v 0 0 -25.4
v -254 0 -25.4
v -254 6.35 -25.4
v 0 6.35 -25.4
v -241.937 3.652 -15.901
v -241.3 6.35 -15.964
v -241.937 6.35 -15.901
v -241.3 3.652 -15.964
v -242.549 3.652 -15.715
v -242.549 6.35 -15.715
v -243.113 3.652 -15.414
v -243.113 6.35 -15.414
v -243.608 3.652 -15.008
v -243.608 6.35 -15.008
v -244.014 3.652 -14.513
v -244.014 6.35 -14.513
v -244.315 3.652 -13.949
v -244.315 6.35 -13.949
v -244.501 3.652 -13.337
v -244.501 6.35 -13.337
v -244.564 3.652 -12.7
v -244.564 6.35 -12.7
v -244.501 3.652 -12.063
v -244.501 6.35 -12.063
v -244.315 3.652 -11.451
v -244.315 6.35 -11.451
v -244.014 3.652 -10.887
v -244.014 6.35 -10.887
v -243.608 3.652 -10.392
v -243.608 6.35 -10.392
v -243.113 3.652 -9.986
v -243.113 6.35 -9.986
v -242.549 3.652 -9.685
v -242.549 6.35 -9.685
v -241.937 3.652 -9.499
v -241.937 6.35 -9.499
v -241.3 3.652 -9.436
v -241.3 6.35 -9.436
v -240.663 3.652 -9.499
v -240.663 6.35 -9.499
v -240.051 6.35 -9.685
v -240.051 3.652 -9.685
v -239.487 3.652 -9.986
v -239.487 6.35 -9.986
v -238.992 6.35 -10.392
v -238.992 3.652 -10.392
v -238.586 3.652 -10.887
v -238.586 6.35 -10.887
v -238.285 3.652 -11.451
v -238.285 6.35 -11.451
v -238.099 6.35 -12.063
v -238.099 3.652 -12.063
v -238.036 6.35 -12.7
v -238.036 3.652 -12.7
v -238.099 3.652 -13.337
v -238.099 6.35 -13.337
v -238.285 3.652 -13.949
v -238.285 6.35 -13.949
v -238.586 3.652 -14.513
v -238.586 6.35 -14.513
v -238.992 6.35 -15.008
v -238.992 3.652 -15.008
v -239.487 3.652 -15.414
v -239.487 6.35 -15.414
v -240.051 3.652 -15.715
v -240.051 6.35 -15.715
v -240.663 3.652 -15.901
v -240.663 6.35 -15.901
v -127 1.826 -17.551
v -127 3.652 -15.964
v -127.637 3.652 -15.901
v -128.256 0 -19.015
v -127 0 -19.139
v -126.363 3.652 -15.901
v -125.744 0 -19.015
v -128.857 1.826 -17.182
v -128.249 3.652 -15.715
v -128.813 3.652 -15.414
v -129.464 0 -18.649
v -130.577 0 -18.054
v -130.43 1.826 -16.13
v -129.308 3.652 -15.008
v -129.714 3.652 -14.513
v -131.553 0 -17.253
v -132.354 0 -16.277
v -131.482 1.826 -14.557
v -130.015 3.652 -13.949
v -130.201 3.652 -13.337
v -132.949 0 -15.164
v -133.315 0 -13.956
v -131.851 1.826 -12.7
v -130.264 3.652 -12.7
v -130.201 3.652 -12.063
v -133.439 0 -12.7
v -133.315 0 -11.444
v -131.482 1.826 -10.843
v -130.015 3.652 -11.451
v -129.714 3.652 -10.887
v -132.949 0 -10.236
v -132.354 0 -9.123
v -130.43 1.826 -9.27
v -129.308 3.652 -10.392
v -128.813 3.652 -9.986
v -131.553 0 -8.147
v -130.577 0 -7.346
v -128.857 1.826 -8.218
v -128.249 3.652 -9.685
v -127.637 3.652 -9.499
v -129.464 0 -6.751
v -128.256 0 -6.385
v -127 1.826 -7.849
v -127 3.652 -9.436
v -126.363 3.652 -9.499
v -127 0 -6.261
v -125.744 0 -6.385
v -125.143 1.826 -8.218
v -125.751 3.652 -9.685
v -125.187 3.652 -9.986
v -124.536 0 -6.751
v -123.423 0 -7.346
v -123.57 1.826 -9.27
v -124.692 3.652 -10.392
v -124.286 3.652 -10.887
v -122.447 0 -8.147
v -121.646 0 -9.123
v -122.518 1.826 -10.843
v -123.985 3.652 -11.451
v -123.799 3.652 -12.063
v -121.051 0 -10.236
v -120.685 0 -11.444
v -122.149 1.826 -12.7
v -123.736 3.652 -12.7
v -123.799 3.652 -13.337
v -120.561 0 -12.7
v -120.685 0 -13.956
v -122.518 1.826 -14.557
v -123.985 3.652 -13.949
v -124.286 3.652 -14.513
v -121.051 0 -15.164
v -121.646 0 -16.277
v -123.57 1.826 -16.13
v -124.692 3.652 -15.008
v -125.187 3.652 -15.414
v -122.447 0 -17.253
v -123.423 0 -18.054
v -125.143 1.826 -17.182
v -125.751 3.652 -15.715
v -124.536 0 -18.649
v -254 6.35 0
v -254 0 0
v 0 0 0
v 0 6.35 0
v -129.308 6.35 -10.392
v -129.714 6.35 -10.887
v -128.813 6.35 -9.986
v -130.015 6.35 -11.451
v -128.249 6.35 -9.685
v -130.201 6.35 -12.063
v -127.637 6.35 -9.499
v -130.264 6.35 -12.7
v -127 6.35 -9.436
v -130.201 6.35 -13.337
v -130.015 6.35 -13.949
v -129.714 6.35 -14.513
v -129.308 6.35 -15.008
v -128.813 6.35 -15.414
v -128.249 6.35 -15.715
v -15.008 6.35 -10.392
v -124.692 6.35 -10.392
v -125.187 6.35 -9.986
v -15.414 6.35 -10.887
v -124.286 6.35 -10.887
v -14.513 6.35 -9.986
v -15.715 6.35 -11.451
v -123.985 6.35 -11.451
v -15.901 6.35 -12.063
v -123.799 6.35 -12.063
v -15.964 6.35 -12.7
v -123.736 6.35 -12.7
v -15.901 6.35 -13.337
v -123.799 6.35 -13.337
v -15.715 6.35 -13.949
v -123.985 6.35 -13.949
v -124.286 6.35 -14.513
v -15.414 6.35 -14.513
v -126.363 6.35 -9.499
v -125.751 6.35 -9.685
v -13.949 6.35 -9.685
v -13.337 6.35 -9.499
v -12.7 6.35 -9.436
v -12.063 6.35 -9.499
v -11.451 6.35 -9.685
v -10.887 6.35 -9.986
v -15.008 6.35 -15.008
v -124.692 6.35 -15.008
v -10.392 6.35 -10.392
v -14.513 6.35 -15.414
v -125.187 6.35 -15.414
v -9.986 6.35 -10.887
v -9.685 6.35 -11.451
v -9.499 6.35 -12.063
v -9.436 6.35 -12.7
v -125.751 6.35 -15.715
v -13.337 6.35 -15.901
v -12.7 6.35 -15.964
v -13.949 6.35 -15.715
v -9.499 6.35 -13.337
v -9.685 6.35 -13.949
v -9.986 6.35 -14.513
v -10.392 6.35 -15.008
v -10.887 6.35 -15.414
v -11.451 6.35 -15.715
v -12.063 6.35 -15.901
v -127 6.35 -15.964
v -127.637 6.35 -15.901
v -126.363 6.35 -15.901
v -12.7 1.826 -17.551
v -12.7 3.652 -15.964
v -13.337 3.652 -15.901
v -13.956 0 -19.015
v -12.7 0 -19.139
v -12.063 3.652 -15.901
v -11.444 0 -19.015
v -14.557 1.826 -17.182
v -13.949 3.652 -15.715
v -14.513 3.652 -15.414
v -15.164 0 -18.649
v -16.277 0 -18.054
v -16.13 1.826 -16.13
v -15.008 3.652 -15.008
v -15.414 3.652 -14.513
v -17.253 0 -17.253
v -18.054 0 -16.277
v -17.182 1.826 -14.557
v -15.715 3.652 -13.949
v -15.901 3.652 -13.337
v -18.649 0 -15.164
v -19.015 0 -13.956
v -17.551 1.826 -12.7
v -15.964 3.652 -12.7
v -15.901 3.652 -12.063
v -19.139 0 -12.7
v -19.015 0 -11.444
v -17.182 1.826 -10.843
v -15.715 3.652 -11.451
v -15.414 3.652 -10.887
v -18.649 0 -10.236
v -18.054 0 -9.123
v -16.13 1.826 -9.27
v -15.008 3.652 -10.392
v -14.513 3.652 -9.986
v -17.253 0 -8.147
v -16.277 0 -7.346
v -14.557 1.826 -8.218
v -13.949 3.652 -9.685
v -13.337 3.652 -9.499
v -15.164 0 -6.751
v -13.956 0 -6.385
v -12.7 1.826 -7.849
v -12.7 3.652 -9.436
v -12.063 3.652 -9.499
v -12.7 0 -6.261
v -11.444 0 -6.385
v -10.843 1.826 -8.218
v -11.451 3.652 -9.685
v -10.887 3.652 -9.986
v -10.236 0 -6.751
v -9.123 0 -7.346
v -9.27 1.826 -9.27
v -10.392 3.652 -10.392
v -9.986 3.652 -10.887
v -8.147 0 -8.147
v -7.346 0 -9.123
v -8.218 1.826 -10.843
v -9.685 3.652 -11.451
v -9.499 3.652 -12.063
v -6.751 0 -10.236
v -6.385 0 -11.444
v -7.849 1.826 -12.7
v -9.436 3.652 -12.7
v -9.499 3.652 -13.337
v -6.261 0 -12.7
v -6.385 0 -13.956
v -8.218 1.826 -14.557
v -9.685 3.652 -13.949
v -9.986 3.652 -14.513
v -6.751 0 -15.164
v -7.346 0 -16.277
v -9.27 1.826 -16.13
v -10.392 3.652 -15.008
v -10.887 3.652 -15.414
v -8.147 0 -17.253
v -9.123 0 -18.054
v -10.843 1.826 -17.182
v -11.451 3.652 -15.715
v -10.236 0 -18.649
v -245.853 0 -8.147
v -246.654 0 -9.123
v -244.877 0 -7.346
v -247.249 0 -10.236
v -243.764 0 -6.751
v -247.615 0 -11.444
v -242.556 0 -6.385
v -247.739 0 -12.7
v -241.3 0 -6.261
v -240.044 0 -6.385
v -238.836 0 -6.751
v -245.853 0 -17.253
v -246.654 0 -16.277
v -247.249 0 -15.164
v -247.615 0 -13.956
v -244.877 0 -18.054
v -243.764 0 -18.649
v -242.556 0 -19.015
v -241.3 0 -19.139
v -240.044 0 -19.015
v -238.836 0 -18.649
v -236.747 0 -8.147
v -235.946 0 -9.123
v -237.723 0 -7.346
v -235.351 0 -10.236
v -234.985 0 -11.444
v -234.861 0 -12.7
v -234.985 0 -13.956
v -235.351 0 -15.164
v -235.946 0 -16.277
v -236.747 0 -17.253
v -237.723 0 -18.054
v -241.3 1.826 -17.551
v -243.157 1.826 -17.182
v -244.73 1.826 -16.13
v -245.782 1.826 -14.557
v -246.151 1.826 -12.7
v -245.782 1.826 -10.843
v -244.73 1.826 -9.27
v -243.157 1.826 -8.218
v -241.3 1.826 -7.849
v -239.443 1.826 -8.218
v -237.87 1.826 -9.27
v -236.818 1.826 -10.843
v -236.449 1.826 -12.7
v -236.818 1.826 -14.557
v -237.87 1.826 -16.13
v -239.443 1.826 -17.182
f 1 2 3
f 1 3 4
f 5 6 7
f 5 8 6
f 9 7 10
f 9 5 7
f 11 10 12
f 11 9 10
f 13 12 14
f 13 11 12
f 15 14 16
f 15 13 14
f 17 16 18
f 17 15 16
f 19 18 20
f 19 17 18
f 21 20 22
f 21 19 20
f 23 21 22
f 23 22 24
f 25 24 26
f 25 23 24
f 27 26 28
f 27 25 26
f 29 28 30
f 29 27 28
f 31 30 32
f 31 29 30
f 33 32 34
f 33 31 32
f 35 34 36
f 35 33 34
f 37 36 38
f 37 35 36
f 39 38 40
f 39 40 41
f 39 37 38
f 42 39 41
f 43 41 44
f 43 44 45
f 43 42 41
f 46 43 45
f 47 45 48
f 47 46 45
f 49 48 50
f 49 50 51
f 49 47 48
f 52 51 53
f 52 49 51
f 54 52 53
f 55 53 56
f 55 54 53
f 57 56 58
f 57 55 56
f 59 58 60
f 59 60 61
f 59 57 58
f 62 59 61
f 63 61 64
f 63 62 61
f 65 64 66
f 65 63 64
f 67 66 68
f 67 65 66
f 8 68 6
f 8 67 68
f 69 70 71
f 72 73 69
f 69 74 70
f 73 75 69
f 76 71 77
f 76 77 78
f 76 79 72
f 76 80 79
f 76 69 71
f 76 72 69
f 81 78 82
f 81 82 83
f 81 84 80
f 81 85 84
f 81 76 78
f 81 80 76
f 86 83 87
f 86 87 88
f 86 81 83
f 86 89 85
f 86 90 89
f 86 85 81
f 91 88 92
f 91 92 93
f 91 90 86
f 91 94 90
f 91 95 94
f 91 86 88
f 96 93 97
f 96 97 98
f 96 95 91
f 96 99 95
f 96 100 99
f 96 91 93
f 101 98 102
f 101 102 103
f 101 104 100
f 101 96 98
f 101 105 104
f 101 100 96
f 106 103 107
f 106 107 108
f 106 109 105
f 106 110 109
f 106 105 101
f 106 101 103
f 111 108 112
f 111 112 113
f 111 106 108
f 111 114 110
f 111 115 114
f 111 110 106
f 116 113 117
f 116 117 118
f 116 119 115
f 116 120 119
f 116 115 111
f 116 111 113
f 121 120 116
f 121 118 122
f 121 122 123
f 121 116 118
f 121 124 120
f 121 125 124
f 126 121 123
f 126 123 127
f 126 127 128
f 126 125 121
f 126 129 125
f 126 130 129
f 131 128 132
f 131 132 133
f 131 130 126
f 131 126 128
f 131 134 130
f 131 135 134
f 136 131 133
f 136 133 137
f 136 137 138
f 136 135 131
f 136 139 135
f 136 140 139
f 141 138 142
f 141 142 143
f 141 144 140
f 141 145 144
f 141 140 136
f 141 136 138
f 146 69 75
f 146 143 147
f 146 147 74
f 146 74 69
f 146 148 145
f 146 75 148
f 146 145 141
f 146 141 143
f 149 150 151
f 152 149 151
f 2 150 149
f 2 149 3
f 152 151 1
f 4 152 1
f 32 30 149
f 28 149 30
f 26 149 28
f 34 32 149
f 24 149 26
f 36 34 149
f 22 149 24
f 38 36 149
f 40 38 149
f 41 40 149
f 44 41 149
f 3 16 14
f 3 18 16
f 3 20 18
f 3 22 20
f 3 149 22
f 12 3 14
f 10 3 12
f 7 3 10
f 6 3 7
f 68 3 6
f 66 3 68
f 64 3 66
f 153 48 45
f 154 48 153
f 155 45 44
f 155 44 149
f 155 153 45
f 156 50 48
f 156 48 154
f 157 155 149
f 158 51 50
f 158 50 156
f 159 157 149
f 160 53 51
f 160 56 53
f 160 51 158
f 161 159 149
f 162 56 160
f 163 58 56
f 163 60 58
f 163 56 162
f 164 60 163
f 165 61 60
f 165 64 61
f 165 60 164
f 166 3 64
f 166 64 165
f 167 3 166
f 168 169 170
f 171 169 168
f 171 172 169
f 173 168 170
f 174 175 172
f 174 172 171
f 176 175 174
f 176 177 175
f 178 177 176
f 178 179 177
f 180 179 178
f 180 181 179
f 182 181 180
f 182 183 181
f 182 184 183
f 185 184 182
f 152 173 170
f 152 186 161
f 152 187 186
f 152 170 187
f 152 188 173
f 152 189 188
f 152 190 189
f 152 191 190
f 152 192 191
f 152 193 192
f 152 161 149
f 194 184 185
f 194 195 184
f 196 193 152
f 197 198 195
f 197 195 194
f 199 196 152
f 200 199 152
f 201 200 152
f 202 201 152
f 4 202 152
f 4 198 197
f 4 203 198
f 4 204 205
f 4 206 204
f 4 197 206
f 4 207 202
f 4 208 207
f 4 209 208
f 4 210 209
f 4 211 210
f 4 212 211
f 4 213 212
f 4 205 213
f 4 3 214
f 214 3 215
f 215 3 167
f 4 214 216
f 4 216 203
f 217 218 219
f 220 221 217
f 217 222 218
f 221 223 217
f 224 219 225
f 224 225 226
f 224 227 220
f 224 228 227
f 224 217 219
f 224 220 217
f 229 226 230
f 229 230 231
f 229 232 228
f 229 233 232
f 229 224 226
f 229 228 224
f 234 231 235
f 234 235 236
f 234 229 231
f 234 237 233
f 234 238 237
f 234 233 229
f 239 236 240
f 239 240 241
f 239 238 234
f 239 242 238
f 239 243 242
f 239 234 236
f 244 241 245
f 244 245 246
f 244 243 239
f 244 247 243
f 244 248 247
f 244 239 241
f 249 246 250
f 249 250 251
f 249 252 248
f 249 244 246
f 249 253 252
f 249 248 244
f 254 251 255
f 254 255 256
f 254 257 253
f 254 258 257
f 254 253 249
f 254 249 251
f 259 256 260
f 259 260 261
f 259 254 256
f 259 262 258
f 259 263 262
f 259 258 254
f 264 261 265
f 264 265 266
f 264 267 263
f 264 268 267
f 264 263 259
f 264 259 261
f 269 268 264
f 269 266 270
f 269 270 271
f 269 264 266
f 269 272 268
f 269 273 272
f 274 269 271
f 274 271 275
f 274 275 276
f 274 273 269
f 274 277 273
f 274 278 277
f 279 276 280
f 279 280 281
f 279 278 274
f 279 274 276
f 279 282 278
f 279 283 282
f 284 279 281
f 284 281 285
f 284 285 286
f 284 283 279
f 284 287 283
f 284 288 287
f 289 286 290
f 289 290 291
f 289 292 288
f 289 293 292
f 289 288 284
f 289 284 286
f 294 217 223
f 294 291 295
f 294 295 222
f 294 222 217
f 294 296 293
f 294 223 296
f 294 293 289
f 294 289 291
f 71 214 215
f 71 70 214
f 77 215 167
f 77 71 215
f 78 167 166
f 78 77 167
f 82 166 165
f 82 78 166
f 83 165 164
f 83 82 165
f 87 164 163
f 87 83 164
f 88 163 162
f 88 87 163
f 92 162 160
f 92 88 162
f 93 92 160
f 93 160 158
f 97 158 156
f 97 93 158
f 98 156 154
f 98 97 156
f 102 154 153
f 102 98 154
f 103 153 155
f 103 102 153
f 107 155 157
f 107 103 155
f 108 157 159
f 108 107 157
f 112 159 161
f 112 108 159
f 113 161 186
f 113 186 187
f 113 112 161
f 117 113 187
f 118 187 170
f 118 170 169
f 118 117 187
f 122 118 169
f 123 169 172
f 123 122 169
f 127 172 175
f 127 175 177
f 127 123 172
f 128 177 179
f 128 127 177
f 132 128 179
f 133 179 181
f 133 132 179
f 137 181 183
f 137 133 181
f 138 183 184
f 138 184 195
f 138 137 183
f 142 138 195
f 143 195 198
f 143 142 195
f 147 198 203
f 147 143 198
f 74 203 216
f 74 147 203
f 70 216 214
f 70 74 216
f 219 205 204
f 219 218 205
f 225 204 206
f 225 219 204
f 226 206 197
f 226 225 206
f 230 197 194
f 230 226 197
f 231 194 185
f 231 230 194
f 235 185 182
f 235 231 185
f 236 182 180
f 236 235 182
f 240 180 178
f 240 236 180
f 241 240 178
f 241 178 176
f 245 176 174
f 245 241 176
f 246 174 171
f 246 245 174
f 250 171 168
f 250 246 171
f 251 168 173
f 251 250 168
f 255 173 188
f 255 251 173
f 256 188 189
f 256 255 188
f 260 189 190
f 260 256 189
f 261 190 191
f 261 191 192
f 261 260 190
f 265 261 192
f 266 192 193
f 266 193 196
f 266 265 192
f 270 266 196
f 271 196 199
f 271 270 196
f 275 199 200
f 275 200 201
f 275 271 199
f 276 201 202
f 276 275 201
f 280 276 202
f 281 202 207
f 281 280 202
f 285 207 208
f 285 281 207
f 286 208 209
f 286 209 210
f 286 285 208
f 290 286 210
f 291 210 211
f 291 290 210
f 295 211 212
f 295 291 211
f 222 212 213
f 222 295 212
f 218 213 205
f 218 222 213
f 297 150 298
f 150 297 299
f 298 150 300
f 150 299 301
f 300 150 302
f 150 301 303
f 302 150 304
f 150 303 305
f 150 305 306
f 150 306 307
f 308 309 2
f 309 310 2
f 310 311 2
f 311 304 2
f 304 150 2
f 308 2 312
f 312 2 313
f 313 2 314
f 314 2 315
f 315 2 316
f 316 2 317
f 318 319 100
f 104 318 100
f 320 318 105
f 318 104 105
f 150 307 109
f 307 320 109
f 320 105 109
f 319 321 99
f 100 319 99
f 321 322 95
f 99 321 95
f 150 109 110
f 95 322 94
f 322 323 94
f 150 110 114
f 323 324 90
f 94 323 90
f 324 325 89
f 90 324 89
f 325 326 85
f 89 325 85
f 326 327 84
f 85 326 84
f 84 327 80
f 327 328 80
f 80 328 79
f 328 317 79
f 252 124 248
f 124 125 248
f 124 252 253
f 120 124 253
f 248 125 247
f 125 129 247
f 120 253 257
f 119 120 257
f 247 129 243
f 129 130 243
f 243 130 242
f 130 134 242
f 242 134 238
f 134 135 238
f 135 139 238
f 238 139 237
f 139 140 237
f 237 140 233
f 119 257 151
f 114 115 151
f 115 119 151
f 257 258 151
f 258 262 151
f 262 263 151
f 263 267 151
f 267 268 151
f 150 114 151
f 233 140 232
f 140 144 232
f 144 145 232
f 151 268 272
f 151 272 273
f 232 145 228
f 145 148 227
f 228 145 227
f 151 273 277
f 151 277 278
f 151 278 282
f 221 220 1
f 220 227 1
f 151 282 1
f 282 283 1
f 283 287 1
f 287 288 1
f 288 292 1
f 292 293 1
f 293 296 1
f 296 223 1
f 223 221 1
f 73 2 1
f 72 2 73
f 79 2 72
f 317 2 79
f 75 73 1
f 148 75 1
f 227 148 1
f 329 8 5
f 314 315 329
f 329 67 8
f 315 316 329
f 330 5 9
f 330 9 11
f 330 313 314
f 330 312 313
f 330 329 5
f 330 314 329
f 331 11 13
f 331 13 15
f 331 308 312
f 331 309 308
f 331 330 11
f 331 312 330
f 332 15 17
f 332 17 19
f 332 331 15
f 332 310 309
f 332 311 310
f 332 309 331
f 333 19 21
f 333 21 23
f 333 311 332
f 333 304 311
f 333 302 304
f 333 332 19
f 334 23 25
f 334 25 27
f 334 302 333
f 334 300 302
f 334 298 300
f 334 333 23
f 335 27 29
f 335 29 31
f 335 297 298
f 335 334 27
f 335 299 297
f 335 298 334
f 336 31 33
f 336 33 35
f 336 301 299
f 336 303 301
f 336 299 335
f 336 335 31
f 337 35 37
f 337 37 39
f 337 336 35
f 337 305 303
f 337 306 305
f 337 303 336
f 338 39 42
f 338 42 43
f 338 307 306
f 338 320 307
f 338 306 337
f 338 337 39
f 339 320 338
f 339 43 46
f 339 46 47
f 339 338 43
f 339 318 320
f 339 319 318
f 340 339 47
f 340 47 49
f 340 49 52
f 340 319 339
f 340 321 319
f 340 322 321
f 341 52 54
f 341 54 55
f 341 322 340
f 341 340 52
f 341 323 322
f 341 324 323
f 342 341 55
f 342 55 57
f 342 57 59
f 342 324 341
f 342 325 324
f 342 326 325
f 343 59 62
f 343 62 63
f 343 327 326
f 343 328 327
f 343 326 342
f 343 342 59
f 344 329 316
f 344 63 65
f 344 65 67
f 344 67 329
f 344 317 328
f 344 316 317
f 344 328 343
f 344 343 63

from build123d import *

# Parameters (mm, degrees)
SKETCH1_W                                     = 254
SKETCH1_H                                     = 25.4
BOSS_EXTRUDE1_DEPTH                           = 6.35
CSK_FOR_1_4_FLAT_HEAD_MACHINE_SCREW1_AT_COUNT = 2
CSK_FOR_1_4_FLAT_HEAD_MACHINE_SCREW1_AT_PITCH = 228.6
CSK_FOR_1_4_FLAT_HEAD_MACHINE_SCREW1_2_COUNT  = 2
CSK_FOR_1_4_FLAT_HEAD_MACHINE_SCREW1_2_PITCH  = 114.3


with BuildPart() as part:
    # Sketch1 → Boss-Extrude1 (new body)
    with BuildSketch(Plane(origin=(0, 0, 0), x_dir=(1, 0, 0), z_dir=(0, 1, 0))):
        with Locations((-127, 12.7)):
            Rectangle(SKETCH1_W, SKETCH1_H)
    extrude(amount=BOSS_EXTRUDE1_DEPTH)

    # Sketch7 → CSK for 1/4 Flat Head Machine Screw1 (revolve, cut)
    with BuildSketch(Plane(origin=(-241.3, 0, -12.7), x_dir=(0, 0, -1), z_dir=(1, 0, 0))):
        Polygon((0, 0), (0, 6.35), (3.2639, 6.35), (3.2639, 3.652419693), (6.4389, 0), align=None)
    csk_for_1_4_flat_head_machine_screw1 = revolve(axis=Axis((-241.3, -6.35, -12.7), (0, 1, 0)), mode=Mode.SUBTRACT)

    # CSK for 1/4 Flat Head Machine Screw1 at: CSK for 1/4 Flat Head Machine Screw1 ×2
    with Locations(*[(i * CSK_FOR_1_4_FLAT_HEAD_MACHINE_SCREW1_AT_PITCH, 0, 0) for i in range(1, CSK_FOR_1_4_FLAT_HEAD_MACHINE_SCREW1_AT_COUNT)]):
        add(csk_for_1_4_flat_head_machine_screw1, mode=Mode.SUBTRACT)

    # CSK for 1_4 Flat Head Machine Screw1 2: CSK for 1/4 Flat Head Machine Screw1 ×2
    with Locations(*[(i * CSK_FOR_1_4_FLAT_HEAD_MACHINE_SCREW1_2_PITCH, 0, 0) for i in range(1, CSK_FOR_1_4_FLAT_HEAD_MACHINE_SCREW1_2_COUNT)]):
        add(csk_for_1_4_flat_head_machine_screw1, mode=Mode.SUBTRACT)


solid = part.part
